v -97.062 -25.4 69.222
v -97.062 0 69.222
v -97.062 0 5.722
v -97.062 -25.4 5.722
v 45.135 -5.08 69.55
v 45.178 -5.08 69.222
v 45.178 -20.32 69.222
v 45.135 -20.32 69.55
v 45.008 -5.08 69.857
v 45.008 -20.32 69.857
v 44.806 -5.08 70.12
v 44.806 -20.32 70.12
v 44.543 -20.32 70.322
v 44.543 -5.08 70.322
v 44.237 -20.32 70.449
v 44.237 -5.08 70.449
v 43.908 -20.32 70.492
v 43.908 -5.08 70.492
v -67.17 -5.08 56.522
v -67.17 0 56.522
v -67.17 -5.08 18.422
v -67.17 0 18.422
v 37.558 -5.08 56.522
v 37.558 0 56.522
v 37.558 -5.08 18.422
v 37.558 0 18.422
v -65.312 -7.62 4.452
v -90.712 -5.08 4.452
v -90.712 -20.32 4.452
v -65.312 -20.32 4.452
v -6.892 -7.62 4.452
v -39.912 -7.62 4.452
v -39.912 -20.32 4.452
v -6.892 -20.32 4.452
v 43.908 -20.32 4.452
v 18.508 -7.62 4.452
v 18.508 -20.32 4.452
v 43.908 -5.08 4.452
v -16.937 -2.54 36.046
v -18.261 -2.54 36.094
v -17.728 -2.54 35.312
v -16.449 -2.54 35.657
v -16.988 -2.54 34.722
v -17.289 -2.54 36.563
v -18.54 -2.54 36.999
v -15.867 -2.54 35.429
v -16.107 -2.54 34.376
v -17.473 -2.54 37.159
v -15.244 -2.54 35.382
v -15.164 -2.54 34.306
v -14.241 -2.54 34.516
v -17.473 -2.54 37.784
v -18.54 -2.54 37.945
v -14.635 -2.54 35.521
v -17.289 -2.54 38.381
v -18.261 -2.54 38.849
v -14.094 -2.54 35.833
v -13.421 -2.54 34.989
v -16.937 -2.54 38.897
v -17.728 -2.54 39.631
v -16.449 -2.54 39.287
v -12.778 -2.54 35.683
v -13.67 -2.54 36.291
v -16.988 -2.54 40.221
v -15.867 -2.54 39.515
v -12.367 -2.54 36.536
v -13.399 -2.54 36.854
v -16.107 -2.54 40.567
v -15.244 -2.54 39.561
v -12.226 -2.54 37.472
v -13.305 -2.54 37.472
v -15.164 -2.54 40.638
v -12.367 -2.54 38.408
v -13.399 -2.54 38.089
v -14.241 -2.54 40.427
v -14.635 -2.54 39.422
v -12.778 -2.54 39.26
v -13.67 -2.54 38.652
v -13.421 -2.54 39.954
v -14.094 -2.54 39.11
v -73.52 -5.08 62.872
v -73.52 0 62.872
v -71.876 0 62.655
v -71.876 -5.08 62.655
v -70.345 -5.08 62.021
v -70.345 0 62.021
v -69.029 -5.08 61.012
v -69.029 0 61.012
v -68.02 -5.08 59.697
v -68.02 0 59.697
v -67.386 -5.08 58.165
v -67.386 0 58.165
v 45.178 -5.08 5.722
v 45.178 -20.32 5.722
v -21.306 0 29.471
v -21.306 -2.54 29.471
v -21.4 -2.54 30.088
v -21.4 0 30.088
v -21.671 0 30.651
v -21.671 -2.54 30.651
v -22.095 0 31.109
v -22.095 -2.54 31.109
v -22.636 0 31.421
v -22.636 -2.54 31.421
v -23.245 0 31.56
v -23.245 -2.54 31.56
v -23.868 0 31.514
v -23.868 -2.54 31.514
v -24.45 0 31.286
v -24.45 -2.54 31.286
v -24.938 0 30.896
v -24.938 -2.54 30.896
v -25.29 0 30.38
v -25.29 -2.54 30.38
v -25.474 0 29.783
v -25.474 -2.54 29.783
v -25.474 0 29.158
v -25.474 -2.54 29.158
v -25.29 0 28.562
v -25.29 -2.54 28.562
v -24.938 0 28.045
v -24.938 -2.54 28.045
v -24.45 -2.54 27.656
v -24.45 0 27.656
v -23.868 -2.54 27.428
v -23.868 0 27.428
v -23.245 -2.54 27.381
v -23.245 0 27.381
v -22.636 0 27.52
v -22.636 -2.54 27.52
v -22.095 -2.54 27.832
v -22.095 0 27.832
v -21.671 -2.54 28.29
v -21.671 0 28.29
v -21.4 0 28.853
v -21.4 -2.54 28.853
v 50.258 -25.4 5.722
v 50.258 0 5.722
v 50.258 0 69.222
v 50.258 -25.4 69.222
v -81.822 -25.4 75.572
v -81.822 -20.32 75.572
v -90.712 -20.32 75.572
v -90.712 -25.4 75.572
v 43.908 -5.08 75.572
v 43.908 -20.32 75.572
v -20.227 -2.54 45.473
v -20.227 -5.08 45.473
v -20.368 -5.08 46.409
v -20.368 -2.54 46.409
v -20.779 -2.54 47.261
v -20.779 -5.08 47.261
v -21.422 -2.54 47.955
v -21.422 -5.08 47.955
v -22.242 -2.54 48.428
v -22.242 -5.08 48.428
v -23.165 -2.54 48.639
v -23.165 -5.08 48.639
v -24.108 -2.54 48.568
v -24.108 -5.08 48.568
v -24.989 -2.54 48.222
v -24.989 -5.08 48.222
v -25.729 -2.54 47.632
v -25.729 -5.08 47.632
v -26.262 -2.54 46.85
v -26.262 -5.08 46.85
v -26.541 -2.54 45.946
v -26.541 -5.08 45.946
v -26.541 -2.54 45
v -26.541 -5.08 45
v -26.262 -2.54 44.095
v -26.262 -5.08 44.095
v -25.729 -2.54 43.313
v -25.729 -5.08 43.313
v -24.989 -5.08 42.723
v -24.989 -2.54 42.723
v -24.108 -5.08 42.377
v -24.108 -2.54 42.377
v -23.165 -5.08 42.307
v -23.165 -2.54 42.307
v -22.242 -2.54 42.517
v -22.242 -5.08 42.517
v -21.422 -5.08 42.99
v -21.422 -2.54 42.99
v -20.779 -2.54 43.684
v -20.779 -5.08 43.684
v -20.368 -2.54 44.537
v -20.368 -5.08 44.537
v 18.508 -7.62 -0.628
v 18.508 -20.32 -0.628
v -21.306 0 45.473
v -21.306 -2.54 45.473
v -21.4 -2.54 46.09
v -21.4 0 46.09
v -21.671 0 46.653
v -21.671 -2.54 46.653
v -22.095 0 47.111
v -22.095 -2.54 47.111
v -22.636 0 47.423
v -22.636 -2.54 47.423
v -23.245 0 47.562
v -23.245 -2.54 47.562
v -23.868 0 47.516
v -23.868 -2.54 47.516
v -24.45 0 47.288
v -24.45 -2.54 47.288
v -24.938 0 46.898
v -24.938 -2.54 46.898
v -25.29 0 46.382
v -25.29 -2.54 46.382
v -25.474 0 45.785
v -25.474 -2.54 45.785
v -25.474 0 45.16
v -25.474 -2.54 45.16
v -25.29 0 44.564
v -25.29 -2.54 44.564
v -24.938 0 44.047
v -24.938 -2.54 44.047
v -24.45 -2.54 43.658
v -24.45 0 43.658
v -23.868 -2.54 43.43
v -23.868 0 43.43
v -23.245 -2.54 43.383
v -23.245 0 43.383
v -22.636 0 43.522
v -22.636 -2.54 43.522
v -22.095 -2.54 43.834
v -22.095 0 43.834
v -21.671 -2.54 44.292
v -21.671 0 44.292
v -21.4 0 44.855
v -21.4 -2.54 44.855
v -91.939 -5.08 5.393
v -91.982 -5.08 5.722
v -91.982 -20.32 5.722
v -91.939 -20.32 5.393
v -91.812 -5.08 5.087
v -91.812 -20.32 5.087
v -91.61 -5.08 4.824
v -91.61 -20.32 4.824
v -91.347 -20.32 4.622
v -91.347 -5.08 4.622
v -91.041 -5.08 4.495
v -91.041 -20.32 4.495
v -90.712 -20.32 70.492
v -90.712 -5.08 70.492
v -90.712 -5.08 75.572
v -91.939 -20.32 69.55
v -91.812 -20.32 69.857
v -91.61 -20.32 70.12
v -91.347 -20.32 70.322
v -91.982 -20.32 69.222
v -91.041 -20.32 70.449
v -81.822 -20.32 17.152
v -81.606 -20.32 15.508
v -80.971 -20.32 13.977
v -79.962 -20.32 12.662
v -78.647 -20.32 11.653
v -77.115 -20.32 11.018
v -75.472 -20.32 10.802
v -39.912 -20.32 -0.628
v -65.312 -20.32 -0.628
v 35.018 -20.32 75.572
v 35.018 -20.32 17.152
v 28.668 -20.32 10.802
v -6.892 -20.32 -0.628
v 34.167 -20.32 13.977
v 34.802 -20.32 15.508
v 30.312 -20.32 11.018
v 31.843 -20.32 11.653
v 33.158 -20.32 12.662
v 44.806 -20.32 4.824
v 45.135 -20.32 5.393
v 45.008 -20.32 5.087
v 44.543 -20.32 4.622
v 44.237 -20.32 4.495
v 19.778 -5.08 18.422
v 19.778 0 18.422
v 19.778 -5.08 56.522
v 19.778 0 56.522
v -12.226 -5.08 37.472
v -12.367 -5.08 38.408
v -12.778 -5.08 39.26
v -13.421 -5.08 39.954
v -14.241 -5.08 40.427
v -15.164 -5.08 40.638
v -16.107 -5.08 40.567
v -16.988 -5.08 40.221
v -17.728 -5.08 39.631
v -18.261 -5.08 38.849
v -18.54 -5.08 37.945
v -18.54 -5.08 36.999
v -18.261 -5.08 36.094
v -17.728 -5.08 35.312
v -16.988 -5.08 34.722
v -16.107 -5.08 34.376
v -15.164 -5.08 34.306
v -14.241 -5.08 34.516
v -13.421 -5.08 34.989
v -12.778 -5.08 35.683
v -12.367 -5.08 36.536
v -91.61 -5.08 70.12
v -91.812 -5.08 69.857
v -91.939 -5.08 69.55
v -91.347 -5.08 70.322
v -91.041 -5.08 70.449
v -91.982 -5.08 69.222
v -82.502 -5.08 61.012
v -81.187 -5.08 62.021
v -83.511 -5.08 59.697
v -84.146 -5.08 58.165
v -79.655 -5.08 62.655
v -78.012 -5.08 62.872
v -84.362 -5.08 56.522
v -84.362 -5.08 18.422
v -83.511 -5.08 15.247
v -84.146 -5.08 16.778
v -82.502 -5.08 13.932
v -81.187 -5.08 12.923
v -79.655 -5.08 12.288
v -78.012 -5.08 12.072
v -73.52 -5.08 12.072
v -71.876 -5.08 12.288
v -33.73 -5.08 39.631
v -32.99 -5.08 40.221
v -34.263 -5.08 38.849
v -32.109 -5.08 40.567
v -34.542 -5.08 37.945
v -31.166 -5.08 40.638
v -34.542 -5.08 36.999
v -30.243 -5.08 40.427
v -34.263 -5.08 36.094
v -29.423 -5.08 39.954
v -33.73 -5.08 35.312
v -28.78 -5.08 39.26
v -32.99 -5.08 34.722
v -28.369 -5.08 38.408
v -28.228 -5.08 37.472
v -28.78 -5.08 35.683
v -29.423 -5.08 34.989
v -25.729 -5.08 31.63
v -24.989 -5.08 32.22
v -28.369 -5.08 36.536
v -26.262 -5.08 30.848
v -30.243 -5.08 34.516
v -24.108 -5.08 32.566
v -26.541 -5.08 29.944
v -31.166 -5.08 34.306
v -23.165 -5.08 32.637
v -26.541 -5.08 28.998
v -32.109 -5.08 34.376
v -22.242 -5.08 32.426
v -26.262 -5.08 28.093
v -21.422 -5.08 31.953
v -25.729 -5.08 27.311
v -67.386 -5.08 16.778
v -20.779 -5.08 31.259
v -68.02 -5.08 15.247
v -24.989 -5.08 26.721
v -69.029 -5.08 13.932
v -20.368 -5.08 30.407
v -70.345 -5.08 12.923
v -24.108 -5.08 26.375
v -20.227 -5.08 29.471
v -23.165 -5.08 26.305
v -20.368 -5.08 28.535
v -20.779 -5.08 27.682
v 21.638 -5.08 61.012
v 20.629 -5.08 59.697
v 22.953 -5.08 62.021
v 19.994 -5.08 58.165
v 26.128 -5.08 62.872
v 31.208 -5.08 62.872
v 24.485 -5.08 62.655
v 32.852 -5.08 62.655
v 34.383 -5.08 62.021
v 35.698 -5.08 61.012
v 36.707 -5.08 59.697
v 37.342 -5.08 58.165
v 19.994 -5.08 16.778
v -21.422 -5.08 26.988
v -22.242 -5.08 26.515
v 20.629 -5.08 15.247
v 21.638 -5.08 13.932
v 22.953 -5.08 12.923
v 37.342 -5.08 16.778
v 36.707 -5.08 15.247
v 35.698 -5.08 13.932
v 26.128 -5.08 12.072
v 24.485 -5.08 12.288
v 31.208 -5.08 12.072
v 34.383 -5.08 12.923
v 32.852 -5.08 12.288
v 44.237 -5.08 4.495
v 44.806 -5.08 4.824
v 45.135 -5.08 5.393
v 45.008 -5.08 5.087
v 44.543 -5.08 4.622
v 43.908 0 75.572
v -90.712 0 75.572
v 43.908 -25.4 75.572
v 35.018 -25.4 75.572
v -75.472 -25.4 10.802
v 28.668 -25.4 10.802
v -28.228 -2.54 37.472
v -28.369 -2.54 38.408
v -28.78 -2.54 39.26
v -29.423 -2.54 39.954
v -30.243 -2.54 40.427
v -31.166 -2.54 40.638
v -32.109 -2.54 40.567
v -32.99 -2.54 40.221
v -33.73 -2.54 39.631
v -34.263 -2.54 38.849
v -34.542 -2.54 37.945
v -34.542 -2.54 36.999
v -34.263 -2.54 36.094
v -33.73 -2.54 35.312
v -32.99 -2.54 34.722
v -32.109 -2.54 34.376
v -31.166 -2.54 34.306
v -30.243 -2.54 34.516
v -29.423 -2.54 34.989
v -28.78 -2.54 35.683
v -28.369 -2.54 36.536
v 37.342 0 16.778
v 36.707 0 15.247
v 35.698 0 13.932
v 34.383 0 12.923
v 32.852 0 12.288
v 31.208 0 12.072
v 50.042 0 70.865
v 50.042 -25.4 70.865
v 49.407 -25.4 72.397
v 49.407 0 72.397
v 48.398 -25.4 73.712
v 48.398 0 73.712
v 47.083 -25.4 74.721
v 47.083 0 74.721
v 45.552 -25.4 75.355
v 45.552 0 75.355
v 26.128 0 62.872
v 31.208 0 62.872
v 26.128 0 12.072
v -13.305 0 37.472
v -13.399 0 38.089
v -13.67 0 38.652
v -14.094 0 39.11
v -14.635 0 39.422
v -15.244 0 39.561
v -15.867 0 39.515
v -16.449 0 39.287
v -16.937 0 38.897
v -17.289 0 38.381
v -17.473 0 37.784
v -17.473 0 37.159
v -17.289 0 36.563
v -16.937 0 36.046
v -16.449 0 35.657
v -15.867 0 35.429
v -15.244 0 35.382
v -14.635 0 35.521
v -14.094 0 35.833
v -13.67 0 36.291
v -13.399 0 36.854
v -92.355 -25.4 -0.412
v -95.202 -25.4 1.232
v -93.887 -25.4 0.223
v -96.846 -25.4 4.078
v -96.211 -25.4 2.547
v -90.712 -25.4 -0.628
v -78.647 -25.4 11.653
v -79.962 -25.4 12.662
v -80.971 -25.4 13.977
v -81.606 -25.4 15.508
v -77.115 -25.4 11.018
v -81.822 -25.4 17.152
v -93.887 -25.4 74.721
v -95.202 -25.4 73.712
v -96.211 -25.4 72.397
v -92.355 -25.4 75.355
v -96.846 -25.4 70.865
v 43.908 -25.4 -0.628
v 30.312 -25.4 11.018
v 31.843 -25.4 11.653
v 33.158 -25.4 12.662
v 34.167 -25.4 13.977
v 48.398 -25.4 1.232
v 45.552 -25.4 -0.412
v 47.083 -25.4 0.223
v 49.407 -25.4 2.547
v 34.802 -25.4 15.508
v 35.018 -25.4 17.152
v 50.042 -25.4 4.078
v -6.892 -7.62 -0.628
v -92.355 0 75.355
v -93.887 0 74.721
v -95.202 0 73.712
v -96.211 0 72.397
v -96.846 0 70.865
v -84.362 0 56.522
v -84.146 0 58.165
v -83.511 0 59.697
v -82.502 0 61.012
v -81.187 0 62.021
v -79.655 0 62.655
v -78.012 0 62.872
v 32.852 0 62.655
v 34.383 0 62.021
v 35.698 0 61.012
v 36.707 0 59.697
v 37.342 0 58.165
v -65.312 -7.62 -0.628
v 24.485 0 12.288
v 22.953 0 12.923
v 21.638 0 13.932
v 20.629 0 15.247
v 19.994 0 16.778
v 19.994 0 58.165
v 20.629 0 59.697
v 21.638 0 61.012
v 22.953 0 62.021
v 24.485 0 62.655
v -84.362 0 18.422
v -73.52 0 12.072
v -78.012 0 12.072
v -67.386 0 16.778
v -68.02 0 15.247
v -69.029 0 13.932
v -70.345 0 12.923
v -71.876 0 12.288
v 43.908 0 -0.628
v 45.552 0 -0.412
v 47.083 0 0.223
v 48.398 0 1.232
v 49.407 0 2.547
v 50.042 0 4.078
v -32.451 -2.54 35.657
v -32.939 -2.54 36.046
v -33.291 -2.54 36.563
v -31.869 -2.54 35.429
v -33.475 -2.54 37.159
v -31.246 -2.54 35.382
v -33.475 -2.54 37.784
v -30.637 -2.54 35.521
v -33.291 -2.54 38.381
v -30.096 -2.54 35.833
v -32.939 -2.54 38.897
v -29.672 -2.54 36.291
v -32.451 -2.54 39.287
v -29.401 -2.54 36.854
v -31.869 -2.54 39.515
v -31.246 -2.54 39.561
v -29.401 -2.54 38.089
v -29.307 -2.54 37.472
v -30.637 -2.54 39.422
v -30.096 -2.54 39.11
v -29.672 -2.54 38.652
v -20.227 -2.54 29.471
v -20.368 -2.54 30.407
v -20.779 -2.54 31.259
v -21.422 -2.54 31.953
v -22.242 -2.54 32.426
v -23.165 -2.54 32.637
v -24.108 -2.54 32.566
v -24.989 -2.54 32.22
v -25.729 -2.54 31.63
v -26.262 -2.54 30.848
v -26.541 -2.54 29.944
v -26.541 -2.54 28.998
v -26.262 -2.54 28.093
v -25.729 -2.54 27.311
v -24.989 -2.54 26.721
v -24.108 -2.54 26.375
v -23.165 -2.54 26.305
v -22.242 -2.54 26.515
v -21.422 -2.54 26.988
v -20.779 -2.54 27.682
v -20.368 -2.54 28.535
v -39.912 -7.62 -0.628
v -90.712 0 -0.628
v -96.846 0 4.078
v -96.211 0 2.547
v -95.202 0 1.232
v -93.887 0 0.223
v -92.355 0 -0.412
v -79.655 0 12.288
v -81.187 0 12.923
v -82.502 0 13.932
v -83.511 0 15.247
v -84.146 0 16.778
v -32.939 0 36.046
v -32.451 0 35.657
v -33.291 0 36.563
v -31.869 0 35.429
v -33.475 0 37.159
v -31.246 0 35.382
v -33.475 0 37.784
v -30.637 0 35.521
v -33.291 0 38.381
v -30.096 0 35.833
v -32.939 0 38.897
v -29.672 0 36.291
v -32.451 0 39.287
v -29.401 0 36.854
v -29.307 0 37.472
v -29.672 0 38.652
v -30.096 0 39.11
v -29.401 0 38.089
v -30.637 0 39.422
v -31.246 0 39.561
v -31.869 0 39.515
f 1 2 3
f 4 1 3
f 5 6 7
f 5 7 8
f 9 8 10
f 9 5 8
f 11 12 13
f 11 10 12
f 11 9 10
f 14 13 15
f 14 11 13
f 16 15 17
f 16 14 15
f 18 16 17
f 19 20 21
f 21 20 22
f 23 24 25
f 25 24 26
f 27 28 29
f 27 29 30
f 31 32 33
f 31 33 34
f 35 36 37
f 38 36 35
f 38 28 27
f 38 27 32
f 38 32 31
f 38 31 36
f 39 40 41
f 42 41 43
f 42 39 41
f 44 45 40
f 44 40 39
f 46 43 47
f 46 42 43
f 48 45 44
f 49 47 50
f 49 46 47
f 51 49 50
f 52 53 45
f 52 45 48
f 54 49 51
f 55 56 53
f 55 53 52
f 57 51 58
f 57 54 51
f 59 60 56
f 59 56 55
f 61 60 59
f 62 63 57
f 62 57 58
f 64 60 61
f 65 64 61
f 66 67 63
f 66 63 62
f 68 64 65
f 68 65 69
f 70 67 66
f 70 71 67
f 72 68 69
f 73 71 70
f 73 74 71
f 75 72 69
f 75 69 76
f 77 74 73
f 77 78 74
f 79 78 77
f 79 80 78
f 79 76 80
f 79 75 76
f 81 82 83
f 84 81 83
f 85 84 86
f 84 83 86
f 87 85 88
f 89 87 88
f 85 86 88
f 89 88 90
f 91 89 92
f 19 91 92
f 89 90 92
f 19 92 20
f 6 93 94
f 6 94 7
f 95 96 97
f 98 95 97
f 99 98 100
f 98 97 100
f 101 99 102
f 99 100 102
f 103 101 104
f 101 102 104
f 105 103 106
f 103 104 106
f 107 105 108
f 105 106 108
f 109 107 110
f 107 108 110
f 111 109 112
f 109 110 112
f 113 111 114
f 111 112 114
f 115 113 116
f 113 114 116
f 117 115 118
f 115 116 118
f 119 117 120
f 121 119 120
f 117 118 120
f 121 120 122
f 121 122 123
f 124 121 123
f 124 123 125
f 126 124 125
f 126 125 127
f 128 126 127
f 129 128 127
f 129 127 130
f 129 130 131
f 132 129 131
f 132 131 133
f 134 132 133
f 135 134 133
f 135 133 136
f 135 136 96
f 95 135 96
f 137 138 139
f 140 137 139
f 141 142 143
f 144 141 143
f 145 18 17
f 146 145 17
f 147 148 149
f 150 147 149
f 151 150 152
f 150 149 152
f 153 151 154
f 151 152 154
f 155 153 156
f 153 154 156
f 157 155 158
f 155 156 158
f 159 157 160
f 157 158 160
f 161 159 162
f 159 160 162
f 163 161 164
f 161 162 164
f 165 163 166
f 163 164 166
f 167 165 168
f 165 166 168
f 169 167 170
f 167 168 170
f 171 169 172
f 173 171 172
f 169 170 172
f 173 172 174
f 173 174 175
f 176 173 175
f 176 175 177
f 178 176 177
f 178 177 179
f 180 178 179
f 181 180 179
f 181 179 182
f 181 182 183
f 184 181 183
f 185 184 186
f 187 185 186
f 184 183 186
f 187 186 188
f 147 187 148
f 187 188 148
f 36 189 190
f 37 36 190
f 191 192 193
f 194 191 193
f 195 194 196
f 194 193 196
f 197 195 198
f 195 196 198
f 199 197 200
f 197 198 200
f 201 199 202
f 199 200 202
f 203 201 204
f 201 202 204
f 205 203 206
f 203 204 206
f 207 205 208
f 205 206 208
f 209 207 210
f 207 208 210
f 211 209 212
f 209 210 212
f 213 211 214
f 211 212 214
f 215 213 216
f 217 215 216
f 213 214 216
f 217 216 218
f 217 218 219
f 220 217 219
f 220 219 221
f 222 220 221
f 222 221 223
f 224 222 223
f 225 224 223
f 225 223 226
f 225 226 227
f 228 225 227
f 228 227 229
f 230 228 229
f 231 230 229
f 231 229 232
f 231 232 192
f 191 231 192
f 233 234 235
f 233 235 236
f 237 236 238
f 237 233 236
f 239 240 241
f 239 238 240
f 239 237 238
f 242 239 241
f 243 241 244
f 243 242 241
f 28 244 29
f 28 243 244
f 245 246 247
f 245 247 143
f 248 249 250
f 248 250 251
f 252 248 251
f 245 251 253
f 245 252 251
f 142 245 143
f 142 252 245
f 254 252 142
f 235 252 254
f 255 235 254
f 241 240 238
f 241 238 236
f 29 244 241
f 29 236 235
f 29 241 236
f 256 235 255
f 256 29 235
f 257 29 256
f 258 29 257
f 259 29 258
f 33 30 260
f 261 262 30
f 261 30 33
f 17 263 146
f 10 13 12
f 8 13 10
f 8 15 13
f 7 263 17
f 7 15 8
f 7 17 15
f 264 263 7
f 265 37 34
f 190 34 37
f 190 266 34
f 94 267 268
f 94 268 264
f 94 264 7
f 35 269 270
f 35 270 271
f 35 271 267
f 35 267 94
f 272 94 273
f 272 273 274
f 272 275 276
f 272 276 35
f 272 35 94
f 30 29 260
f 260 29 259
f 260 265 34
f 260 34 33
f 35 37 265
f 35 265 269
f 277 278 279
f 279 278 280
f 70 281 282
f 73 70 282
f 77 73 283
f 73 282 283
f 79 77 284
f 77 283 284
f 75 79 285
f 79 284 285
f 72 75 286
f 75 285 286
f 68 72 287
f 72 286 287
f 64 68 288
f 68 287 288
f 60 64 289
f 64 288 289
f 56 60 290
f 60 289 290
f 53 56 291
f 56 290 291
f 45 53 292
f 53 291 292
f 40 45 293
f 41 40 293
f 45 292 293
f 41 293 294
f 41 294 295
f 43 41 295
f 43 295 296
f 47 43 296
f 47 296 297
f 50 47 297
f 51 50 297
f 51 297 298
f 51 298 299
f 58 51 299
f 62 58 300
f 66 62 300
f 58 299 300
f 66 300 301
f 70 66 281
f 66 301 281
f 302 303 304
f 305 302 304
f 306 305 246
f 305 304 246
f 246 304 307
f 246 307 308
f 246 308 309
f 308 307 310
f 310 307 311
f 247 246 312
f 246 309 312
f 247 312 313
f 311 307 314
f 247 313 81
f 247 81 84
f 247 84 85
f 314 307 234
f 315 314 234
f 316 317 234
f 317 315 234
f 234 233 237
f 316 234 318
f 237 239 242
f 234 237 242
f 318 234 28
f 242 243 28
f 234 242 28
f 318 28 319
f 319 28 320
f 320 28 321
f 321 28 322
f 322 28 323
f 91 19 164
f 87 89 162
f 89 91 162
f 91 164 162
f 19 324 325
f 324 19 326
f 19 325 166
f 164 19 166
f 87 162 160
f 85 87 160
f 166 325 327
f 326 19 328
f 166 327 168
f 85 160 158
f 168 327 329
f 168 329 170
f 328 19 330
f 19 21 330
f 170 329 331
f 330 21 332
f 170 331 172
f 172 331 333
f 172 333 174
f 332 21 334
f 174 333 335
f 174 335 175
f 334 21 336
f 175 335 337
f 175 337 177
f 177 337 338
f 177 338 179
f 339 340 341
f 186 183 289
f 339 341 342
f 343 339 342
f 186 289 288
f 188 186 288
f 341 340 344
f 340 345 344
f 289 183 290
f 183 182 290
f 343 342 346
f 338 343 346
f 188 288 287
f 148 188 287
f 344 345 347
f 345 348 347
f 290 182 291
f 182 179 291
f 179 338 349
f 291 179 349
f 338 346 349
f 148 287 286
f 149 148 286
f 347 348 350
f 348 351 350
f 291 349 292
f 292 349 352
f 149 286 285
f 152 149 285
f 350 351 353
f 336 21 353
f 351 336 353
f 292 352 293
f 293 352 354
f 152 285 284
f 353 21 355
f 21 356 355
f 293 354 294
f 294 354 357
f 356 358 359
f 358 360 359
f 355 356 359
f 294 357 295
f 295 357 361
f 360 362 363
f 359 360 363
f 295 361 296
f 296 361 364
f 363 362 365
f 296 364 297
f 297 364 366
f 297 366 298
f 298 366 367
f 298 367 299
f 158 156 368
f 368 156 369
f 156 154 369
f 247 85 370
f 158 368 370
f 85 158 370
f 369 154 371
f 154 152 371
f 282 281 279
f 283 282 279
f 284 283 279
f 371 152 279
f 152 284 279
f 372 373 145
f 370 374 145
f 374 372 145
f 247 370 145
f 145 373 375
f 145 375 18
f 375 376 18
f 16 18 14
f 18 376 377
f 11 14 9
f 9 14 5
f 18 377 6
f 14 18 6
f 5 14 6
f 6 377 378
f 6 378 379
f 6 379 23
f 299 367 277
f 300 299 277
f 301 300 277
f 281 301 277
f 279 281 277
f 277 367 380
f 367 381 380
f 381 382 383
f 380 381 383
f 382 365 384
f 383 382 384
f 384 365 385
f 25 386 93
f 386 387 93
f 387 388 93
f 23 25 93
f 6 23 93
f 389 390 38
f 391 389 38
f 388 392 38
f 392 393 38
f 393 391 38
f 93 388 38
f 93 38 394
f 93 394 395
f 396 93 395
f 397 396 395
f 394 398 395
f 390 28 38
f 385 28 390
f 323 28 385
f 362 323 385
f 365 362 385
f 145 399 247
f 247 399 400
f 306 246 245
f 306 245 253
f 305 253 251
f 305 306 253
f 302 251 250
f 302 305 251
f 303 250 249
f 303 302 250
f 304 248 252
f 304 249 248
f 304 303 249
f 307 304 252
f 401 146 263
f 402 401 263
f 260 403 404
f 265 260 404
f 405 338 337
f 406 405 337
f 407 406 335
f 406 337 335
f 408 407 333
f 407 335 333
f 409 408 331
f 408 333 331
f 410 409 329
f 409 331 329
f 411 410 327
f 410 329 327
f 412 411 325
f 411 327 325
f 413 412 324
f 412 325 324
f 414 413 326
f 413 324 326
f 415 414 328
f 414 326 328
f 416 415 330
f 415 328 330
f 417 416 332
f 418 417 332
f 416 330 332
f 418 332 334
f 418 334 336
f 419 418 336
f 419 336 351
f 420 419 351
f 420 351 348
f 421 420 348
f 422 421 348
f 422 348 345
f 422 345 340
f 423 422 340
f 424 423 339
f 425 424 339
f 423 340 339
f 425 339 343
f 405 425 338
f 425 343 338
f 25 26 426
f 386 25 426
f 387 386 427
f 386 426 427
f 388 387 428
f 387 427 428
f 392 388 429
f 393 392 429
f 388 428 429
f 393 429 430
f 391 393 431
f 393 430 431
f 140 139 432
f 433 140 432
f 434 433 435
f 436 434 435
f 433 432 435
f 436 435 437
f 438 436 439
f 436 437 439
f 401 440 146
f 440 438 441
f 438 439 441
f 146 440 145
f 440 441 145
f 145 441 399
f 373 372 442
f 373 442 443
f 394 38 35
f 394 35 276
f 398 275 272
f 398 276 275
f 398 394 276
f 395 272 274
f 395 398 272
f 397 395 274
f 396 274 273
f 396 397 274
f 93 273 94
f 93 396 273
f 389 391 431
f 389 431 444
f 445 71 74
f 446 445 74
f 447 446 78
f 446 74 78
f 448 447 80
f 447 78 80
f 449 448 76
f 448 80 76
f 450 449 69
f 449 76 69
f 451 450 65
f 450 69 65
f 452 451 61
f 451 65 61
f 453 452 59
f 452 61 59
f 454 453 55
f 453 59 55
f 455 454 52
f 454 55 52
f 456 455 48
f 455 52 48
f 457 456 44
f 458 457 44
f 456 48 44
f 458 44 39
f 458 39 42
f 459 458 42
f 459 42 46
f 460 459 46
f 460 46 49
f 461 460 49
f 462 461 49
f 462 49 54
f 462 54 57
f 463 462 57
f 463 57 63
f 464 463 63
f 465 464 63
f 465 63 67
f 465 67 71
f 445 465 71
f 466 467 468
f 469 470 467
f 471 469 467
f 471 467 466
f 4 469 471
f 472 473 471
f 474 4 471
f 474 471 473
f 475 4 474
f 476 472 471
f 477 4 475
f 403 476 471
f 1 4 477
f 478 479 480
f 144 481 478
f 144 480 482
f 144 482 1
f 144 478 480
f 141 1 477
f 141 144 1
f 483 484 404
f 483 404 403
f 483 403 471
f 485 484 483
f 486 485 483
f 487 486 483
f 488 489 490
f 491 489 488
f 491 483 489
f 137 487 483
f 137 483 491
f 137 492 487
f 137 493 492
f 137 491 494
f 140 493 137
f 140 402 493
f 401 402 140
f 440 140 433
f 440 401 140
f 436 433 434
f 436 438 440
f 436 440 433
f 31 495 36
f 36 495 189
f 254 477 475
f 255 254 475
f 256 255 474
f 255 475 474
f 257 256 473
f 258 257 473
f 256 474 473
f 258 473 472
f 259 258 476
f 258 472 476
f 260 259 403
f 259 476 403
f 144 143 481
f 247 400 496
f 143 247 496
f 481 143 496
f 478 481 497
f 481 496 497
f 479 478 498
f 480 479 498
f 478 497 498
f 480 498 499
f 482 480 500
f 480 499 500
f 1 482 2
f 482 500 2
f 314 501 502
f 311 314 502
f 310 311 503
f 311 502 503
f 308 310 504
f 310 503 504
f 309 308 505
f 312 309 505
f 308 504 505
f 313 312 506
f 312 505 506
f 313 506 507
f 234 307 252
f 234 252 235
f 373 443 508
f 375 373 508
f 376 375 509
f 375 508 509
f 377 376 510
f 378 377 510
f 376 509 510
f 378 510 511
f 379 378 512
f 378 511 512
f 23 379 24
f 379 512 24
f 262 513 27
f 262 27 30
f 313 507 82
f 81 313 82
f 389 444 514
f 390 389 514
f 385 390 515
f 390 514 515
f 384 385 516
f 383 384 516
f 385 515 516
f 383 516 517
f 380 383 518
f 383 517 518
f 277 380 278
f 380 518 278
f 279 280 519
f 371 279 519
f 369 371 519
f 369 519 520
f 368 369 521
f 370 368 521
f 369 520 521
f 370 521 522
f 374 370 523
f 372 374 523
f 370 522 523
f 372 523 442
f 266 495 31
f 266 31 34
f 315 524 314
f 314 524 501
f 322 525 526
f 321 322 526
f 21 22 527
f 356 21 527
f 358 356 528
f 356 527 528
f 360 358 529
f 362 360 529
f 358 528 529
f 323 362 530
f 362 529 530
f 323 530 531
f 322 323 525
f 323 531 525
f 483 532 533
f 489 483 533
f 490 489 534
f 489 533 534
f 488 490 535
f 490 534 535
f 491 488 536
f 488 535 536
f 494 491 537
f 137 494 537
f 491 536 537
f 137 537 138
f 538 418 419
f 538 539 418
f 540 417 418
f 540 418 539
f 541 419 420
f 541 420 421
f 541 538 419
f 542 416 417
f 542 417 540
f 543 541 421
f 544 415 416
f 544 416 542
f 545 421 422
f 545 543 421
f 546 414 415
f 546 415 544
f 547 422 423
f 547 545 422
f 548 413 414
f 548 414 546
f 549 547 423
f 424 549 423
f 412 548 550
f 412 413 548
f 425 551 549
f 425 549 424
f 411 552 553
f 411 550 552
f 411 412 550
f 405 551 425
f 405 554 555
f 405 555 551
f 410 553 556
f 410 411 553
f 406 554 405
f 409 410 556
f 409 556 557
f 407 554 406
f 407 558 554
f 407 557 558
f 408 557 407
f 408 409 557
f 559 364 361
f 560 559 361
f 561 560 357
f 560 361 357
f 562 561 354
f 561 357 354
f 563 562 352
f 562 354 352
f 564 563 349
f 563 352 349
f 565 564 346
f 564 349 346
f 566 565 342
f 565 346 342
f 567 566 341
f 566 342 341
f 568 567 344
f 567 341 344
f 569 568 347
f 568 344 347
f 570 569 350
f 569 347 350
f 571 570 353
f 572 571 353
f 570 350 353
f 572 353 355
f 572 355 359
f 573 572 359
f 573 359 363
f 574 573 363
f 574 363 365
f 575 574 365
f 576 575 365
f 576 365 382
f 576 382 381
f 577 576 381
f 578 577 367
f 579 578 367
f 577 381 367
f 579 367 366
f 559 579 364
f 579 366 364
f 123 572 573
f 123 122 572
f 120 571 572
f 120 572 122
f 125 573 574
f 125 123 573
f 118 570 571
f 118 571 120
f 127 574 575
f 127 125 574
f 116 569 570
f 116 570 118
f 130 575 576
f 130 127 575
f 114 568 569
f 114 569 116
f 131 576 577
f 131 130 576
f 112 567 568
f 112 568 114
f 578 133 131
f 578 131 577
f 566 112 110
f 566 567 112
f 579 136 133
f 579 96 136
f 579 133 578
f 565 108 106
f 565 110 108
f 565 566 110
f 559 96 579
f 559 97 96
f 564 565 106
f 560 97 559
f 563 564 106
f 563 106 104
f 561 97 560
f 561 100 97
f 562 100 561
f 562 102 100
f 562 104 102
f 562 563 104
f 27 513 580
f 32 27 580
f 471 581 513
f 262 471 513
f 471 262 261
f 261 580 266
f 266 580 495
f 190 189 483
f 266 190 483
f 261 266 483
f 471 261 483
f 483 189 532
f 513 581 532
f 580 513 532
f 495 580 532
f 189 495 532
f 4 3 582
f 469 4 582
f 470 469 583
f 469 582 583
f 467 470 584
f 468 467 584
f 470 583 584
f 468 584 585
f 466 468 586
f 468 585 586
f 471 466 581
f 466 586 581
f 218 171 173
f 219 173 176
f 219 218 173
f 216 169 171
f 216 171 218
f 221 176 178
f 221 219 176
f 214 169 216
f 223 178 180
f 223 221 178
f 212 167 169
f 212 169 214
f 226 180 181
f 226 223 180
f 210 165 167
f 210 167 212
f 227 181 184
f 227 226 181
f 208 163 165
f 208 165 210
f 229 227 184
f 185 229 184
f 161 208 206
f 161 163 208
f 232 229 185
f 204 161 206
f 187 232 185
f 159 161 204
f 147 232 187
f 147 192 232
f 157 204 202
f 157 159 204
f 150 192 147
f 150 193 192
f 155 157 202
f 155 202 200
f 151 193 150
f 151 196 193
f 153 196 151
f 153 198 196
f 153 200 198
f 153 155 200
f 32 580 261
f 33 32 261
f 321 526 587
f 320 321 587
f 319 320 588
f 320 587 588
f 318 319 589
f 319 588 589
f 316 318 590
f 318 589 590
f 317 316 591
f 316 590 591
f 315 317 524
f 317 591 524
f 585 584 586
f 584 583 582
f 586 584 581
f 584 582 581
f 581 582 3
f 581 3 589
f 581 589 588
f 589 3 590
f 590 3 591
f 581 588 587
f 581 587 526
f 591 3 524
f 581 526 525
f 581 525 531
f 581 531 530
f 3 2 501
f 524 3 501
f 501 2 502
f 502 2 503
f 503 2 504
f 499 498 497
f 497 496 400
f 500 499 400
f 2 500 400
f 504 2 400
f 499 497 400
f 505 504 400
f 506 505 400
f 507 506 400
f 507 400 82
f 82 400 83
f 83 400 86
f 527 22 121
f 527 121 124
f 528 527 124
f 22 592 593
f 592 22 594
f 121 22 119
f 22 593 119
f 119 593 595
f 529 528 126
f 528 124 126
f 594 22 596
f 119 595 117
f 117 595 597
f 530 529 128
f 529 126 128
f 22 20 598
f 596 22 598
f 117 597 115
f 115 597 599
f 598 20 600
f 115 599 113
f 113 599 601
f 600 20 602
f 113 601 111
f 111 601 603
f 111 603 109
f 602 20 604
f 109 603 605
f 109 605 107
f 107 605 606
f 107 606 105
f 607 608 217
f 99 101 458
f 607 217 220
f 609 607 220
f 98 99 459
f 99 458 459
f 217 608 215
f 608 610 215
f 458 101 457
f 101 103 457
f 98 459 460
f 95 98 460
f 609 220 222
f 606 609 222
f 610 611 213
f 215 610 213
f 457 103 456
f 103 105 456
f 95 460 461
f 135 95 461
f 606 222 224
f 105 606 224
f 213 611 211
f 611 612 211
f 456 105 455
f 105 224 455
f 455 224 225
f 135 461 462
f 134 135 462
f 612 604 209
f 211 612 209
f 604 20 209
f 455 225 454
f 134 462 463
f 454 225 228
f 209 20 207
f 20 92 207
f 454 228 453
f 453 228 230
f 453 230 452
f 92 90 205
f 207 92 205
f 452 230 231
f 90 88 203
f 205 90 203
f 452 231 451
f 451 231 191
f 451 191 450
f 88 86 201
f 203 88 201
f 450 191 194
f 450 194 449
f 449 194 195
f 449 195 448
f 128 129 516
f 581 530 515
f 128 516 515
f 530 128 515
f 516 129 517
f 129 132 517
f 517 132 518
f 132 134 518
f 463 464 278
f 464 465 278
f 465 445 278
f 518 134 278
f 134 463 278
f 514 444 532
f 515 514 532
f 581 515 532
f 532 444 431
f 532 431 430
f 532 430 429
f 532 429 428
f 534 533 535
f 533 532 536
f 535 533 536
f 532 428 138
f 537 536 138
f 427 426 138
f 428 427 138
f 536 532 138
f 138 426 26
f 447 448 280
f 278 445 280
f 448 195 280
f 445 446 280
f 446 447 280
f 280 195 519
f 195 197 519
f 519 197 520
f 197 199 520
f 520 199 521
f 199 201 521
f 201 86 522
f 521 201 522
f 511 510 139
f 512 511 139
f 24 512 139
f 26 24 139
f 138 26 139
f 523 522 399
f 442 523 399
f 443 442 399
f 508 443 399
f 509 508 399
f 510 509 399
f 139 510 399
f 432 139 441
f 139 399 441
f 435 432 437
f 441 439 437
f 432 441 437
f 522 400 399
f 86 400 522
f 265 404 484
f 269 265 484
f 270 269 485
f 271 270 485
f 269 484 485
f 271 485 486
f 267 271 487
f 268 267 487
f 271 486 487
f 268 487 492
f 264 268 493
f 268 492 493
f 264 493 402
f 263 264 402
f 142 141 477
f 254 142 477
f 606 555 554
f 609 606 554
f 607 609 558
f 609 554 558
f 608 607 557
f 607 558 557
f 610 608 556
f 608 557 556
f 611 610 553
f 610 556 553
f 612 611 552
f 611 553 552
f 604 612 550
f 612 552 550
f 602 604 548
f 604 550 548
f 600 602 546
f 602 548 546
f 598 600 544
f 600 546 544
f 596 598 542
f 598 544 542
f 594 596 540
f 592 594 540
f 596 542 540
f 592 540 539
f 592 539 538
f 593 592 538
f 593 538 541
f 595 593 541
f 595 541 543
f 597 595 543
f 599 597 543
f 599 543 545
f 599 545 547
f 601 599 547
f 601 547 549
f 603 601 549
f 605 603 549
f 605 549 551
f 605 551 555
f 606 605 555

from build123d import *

# Parameters (mm, degrees)
F1_DEPTH  = 25.4
F2_T      = -5.08
F4_DEPTH  = 5.08
F6_DEPTH  = 5.08
F7_R      = 2.0955
F8_DEPTH  = 5.08
F9_R      = 3.175
F9_R_2    = 2.0955
F10_DEPTH = 2.54
F11_W     = 25.4
F11_H     = 12.7
F12_DEPTH = 5.08


# Not quite as in the source:
# - a shell that OpenCascade refuses in one call is made with other operations: the cavity is built on its own and cut out


with BuildPart() as f1:
    # F0 (on Front) → F1 (new body)
    with BuildSketch(Plane.XZ):
        with BuildLine():
            Line((43.9080937201, 75.5717812867), (-90.7119062799, 75.5717812867))
            ThreePointArc((-90.7119062799, 75.5717812867), (-95.2020343405, 73.7119093473), (-97.0619062799, 69.2217812867))
            Line((-97.0619062799, 69.2217812867), (-97.0619062799, 5.7217812867))
            ThreePointArc((-97.0619062799, 5.7217812867), (-95.2020343405, 1.2316532262), (-90.7119062799, -0.6282187133))
            Line((-90.7119062799, -0.6282187133), (43.9080937201, -0.6282187133))
            ThreePointArc((43.9080937201, -0.6282187133), (48.3982217806, 1.2316532262), (50.2580937201, 5.7217812867))
            Line((50.2580937201, 5.7217812867), (50.2580937201, 69.2217812867))
            ThreePointArc((50.2580937201, 69.2217812867), (48.3982217806, 73.7119093473), (43.9080937201, 75.5717812867))
        make_face()
    extrude(amount=F1_DEPTH)

    # F2: a shell. OpenCascade refuses it in one call, so the cavity is built on its own and cut out:
    # the body offset inwards by the wall thickness, plus a prism from it out through each open face.
    f2_core = offset(f1.part, amount=F2_T, mode=Mode.PRIVATE)
    f2_exits = [f2_core.faces().sort_by_distance(p)[0] for p in [
        (-23.401906, -12.7, 70.491781),
    ]]
    add(f2_core, mode=Mode.SUBTRACT)
    extrude(f2_exits, amount=-F2_T, mode=Mode.SUBTRACT)

    # F3 (on face) → F4 (cut)
    with BuildSketch(Plane.XZ.offset(25.4)):
        with BuildLine():
            Line((35.0180937201, 75.5717812867), (-81.8219062799, 75.5717812867))
            Line((-81.8219062799, 75.5717812867), (-81.8219062799, 17.1517812867))
            ThreePointArc((-81.8219062799, 17.1517812867), (-79.9620343405, 12.6616532262), (-75.4719062799, 10.8017812867))
            Line((-75.4719062799, 10.8017812867), (28.6680937201, 10.8017812867))
            ThreePointArc((28.6680937201, 10.8017812867), (33.1582217806, 12.6616532262), (35.0180937201, 17.1517812867))
            Line((35.0180937201, 17.1517812867), (35.0180937201, 75.5717812867))
        make_face()
    extrude(amount=-F4_DEPTH, mode=Mode.SUBTRACT)

    # F5 (on face) → F6 (cut)
    with BuildSketch(Plane(origin=(0, 0, 0), x_dir=(-1, 0, 0), z_dir=(0, 1, 0))):
        with BuildLine():
            Line((-26.1280937201, 62.8717812867), (-31.2080937201, 62.8717812867))
            ThreePointArc((-31.2080937201, 62.8717812867), (-35.6982217806, 61.0119093473), (-37.5580937201, 56.5217812867))
            Line((-37.5580937201, 56.5217812867), (-37.5580937201, 18.4217812867))
            ThreePointArc((-37.5580937201, 18.4217812867), (-35.6982217806, 13.9316532262), (-31.2080937201, 12.0717812867))
            Line((-31.2080937201, 12.0717812867), (-26.1280937201, 12.0717812867))
            ThreePointArc((-26.1280937201, 12.0717812867), (-21.6379656595, 13.9316532262), (-19.7780937201, 18.4217812867))
            Line((-19.7780937201, 18.4217812867), (-19.7780937201, 56.5217812867))
            ThreePointArc((-19.7780937201, 56.5217812867), (-21.6379656595, 61.0119093473), (-26.1280937201, 62.8717812867))
        make_face()
        with BuildLine():
            Line((78.0119062799, 62.8717812867), (73.519602201, 62.8717812867))
            ThreePointArc((73.519602201, 62.8717812867), (69.0294741405, 61.0119093473), (67.169602201, 56.5217812867))
            Line((67.169602201, 56.5217812867), (67.169602201, 18.4217812867))
            ThreePointArc((67.169602201, 18.4217812867), (69.0294741405, 13.9316532262), (73.519602201, 12.0717812867))
            Line((73.519602201, 12.0717812867), (78.0119062799, 12.0717812867))
            ThreePointArc((78.0119062799, 12.0717812867), (82.5020343405, 13.9316532262), (84.3619062799, 18.4217812867))
            Line((84.3619062799, 18.4217812867), (84.3619062799, 56.5217812867))
            ThreePointArc((84.3619062799, 56.5217812867), (82.5020343405, 61.0119093473), (78.0119062799, 62.8717812867))
        make_face()
    extrude(amount=-F6_DEPTH, mode=Mode.SUBTRACT)

    # F7 (on face) → F8 (cut)
    with BuildSketch(Plane.XZ.offset(5.08)):
        with Locations((-23.4019062799, 45.4727812867)):
            Circle(F7_R)
        with Locations((-31.4029062799, 37.4717812867)):
            Circle(F7_R)
        with Locations((-23.4019062799, 29.4707812867)):
            Circle(F7_R)
        with Locations((-15.4009062799, 37.4717812867)):
            Circle(F7_R)
    extrude(amount=-F8_DEPTH, mode=Mode.SUBTRACT)

    # F9 (on face) → F10 (cut)
    with BuildSketch(Plane.XZ.offset(5.08)):
        with Locations((-31.4029062799, 37.4717812867)):
            Circle(F9_R)
        with Locations((-31.4029062799, 37.4717812867)):
            Circle(F9_R_2, mode=Mode.SUBTRACT)
        with Locations((-23.4019062799, 45.4727812867)):
            Circle(F9_R)
        with Locations((-23.4019062799, 45.4727812867)):
            Circle(F9_R_2, mode=Mode.SUBTRACT)
        with Locations((-15.4009062799, 37.4717812867)):
            Circle(F9_R)
        with Locations((-15.4009062799, 37.4717812867)):
            Circle(F9_R_2, mode=Mode.SUBTRACT)
        with Locations((-23.4019062799, 29.4707812867)):
            Circle(F9_R)
        with Locations((-23.4019062799, 29.4707812867)):
            Circle(F9_R_2, mode=Mode.SUBTRACT)
    extrude(amount=-F10_DEPTH, mode=Mode.SUBTRACT)

    # F11 (on face) → F12 (cut)
    with BuildSketch(Plane(origin=(0, 0, -0.6282187133), x_dir=(1, 0, 0), z_dir=(0, 0, -1))):
        with Locations((-52.6119062799, 13.97)):
            Rectangle(F11_W, F11_H)
        with Locations((5.8080937201, 13.97)):
            Rectangle(F11_W, F11_H)
    extrude(amount=-F12_DEPTH, mode=Mode.SUBTRACT)


solid = f1.part
